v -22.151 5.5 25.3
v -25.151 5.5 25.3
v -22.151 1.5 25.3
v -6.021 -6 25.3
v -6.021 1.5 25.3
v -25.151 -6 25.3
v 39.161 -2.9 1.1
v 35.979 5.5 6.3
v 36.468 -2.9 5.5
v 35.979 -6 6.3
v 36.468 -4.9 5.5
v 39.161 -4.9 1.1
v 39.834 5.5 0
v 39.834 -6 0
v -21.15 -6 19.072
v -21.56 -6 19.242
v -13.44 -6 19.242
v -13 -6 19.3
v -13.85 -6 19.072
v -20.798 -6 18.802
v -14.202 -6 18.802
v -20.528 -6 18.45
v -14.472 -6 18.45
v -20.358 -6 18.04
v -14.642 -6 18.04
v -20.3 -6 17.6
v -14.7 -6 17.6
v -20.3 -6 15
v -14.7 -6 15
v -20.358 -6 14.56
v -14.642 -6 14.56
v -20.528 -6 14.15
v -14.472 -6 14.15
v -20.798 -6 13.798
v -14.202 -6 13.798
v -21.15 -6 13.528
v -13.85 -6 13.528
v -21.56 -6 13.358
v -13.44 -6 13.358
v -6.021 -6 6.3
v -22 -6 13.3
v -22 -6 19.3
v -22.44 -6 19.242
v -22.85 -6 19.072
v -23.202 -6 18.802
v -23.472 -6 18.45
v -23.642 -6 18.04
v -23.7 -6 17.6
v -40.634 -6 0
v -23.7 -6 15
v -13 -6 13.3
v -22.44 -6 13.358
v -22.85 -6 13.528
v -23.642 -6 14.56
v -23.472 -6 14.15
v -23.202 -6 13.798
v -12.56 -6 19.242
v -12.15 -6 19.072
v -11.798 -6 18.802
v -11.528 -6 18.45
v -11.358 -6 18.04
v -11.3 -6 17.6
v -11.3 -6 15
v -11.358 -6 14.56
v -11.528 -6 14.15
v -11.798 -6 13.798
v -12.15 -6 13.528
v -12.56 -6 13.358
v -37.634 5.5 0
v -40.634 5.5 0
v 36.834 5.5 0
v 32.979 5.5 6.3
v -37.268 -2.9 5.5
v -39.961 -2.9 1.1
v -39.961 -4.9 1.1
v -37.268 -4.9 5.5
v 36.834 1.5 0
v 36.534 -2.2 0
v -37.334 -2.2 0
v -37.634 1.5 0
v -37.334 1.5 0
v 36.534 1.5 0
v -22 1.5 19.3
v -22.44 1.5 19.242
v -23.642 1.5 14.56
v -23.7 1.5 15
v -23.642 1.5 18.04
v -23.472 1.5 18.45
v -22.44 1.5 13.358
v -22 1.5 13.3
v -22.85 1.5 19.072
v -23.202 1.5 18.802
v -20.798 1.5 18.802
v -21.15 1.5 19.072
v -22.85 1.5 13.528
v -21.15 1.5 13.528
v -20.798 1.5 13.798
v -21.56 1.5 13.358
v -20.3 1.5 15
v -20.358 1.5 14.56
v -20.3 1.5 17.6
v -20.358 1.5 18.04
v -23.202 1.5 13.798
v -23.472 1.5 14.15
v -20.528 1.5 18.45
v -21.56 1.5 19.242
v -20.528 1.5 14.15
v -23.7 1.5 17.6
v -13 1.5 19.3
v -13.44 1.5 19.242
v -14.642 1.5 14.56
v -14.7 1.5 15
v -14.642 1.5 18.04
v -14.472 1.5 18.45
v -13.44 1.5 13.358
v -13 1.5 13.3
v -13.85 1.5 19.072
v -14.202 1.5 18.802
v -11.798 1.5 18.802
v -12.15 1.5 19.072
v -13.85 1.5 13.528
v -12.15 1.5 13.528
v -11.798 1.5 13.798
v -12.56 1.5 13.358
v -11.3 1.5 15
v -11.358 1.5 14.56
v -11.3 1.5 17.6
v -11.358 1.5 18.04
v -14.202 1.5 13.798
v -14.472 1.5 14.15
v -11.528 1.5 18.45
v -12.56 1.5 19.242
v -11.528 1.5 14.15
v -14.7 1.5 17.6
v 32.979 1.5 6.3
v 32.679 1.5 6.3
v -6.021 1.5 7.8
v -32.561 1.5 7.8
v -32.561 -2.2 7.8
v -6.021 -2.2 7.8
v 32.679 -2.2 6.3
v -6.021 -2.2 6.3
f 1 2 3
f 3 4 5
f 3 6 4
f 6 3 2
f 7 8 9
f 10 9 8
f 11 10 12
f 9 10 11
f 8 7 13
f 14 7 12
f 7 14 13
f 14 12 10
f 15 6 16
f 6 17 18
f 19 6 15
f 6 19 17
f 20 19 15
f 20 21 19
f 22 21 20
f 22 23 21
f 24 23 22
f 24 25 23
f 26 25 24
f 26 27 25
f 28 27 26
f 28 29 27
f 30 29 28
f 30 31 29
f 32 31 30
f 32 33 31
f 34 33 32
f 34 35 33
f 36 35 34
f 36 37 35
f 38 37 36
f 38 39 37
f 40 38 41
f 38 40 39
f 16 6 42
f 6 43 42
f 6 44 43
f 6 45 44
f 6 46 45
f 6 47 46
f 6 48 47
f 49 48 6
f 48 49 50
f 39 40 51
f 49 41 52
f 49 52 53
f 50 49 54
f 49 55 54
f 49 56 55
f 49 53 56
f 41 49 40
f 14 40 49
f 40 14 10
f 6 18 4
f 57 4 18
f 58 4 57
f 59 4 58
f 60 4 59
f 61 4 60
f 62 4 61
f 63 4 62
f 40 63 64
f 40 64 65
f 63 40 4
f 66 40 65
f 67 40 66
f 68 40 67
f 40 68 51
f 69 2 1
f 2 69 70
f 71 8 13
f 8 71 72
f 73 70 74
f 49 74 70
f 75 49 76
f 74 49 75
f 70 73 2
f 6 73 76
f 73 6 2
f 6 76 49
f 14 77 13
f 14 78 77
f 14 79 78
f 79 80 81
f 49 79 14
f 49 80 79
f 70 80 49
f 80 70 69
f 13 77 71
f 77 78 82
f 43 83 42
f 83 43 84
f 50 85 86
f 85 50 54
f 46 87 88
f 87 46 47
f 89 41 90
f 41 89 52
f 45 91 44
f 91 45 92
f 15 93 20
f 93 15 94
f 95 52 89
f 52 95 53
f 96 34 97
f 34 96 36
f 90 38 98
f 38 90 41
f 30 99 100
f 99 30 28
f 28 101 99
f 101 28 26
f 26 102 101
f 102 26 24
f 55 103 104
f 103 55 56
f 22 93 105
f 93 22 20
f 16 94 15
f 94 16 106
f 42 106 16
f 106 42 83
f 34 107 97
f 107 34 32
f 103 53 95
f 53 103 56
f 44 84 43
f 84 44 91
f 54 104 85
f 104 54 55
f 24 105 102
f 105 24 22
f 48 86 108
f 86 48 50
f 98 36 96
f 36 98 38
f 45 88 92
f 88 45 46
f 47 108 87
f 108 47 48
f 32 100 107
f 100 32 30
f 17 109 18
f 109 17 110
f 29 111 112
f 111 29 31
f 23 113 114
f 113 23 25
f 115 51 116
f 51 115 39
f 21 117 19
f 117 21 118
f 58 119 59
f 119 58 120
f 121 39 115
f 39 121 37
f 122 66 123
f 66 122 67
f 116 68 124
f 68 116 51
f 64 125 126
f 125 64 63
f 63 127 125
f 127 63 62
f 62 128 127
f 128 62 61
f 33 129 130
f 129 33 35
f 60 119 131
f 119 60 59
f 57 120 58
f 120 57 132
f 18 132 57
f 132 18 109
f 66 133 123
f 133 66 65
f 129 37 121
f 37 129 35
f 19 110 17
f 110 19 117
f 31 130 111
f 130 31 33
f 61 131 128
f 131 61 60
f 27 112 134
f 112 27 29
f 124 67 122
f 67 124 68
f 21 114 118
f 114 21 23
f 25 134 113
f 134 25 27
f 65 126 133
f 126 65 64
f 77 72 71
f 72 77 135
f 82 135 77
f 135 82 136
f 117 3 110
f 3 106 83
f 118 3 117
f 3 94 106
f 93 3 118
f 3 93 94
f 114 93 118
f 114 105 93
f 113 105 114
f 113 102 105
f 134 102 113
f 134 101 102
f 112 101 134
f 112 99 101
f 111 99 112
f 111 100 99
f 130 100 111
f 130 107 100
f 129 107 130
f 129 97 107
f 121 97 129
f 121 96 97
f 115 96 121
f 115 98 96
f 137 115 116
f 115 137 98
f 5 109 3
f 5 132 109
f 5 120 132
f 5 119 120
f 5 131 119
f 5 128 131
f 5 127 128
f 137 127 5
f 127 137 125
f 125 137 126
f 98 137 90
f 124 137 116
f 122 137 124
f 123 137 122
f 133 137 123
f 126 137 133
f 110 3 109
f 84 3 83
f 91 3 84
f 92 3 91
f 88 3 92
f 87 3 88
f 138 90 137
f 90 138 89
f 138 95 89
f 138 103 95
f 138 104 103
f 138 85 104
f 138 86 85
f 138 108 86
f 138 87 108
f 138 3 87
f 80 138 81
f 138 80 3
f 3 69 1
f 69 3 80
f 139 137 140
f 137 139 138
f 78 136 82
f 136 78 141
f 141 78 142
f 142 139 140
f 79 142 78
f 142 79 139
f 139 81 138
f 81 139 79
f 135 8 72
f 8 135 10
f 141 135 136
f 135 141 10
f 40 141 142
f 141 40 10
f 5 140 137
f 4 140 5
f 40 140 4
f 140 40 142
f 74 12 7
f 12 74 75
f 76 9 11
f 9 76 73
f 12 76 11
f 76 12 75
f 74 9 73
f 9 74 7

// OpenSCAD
/*
Braccio gripper saddle - fit piece
==================================
The saddle the gripper-top camera holders stand on, by itself: pad, jaws,
servo slot, tie tunnel and screw slots, with no camera on it. It is a short
print for trying the fit on the gripper block before printing a holder.

Measure the gripper, set the values marked MEASURE in
braccio_gripper_camera_lib.scad, export this, and check that:

  - the jaws sit down both sloping edges of the block and the pad cannot twist;
  - the gripper servo, its horn and its lead are clear in the slot;
  - the claws open and close under the front of the pad without touching it;
  - a cable tie through the tunnel goes round the block without crossing the
    servo or the finger linkage.

    openscad -o braccio_gripper_saddle_fit_test.stl braccio_gripper_saddle_fit_test.scad

It prints standing on its front end, the end nearest the fingers.
*/

include <braccio_gripper_camera_lib.scad>

pose = "print";             // [print, gripper]
front_z = 29.3;             // where the holders' pads end, in the wrist roll frame

// Unused by this part, but the shared file expects each part to define them.
camera_height = 20;
face_z = 29;
bed_w = 6;

module saddle_fit_test() {
    difference() {
        intersection() {
            saddle_body();
            translate([-200, -200, front_z]) mirror([0, 0, 1]) cube(400);
        }
        saddle_cuts();
    }
}

if (pose == "gripper") saddle_fit_test();
else translate([0, 0, front_z]) rotate([180, 0, 0]) saddle_fit_test();
